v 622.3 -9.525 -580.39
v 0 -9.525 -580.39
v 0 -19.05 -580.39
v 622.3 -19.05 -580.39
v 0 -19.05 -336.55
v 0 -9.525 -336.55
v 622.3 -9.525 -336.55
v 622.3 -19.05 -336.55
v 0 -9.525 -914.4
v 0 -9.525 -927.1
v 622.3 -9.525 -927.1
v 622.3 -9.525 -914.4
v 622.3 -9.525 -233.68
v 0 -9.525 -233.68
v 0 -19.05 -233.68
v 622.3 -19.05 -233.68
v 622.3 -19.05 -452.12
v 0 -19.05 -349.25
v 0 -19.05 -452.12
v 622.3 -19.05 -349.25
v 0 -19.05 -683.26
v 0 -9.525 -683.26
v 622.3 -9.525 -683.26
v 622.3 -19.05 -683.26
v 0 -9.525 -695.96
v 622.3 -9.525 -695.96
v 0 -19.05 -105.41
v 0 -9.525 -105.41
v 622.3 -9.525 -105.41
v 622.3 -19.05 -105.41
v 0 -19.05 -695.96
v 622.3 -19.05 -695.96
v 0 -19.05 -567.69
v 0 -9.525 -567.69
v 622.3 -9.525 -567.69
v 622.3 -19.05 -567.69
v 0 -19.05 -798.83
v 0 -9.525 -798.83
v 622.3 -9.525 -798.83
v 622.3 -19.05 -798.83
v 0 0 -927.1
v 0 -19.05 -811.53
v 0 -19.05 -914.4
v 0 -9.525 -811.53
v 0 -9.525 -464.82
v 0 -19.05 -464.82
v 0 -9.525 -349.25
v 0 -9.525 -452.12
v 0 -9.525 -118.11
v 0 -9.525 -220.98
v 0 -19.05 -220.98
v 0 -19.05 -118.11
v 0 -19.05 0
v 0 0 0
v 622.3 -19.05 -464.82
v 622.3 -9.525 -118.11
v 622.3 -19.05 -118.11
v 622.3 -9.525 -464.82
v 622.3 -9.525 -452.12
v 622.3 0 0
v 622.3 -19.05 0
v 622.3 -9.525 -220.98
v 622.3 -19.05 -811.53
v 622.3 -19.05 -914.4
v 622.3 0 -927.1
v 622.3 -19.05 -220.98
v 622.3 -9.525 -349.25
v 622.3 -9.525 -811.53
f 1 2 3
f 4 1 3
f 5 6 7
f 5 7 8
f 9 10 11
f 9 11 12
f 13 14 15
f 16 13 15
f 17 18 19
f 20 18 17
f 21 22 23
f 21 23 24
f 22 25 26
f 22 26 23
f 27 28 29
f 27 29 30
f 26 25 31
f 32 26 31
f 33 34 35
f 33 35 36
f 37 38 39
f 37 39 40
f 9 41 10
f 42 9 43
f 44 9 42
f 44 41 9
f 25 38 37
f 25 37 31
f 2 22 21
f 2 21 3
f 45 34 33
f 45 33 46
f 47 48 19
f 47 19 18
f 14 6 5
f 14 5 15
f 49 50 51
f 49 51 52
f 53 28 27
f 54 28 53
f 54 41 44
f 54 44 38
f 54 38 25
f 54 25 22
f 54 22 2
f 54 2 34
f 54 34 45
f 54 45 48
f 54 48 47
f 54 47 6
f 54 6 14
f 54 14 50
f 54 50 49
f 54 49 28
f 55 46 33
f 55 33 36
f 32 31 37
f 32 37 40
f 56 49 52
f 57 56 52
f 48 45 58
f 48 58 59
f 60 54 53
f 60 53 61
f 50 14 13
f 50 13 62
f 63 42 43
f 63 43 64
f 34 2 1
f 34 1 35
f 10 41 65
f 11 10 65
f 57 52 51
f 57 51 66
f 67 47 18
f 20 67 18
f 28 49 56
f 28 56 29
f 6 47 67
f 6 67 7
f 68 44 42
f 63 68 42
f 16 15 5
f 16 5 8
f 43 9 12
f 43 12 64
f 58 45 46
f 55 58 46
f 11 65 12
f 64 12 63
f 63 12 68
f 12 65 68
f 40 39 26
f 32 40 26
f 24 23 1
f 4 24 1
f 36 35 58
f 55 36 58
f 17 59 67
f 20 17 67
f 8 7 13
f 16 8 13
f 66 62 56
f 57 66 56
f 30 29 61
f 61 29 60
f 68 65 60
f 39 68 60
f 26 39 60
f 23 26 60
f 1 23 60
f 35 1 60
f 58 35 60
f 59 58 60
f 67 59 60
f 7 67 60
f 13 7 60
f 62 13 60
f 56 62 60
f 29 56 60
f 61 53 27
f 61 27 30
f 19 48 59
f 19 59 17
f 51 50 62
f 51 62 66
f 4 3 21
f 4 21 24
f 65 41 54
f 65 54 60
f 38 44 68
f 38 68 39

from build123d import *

# Parameters (mm, degrees)
F0_W     = 622.3
F0_H     = 927.1
F1_DEPTH = 19.05
F2_W     = 9.525
F2_H     = 12.7
F3_DEPTH = 622.3


with BuildPart() as f1:
    # F0 (on Front) → F1 (new body)
    with BuildSketch(Plane.XZ):
        with Locations((311.15, -463.55)):
            Rectangle(F0_W, F0_H)
    extrude(amount=F1_DEPTH)

    # F2 (on face) → F3 (cut)
    with BuildSketch(Plane(origin=(0, 0, 0), x_dir=(0, -1, 0), z_dir=(-1, 0, 0))):
        with Locations((14.2875, -111.76)):
            Rectangle(F2_W, F2_H)
        with Locations((14.2875, -227.33)):
            Rectangle(F2_W, F2_H)
        with Locations((14.2875, -342.9)):
            Rectangle(F2_W, F2_H)
        with Locations((14.2875, -458.47)):
            Rectangle(F2_W, F2_H)
        with Locations((14.2875, -574.04)):
            Rectangle(F2_W, F2_H)
        with Locations((14.2875, -689.61)):
            Rectangle(F2_W, F2_H)
        with Locations((14.2875, -805.18)):
            Rectangle(F2_W, F2_H)
        with Locations((14.2875, -920.75)):
            Rectangle(F2_W, F2_H)
    extrude(amount=-F3_DEPTH, mode=Mode.SUBTRACT)


solid = f1.part
